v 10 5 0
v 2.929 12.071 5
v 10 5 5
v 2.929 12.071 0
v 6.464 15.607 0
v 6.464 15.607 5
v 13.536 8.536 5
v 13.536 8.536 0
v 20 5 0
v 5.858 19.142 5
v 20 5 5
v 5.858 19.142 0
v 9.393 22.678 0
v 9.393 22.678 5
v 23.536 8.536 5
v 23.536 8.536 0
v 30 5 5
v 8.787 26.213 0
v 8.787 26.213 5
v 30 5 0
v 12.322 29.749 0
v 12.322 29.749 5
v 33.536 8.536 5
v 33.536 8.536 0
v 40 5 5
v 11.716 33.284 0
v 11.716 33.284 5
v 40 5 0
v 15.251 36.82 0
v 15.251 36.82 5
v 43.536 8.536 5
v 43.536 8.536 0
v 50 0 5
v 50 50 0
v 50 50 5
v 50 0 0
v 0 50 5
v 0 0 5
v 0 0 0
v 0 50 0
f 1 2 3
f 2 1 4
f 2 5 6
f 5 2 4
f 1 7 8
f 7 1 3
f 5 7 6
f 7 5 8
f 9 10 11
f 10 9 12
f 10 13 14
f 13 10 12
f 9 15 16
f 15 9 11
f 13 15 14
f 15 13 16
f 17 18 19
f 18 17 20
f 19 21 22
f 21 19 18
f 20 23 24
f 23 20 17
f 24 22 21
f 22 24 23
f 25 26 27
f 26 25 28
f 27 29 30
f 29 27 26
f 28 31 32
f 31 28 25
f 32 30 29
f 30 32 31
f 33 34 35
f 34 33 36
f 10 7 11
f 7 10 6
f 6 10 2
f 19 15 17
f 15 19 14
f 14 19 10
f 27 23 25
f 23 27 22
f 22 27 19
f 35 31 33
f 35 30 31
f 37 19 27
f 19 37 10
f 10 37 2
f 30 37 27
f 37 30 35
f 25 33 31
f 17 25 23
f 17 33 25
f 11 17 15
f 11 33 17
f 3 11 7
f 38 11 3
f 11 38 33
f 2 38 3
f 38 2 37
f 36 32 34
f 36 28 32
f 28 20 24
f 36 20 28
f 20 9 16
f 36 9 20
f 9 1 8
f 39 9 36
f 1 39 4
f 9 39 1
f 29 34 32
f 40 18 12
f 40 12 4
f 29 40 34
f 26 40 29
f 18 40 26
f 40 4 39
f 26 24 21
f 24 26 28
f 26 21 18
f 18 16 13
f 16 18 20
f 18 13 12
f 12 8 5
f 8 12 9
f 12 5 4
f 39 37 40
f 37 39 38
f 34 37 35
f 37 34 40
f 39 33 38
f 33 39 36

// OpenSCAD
w = 50;
h = 50;
l = 5;

hw = 5;
hg = 5;
vg = 5;

difference() {
cube([w,h,l]);
count = w/(hw+hg);

for (i = [1 : count-1]) {
    color("red")
    translate([i*(hw+hg),vg,-1])
    rotate(45,0,0)
    cube([hw,h-(hg*2)*(count-i),l+2]);
    }
}
